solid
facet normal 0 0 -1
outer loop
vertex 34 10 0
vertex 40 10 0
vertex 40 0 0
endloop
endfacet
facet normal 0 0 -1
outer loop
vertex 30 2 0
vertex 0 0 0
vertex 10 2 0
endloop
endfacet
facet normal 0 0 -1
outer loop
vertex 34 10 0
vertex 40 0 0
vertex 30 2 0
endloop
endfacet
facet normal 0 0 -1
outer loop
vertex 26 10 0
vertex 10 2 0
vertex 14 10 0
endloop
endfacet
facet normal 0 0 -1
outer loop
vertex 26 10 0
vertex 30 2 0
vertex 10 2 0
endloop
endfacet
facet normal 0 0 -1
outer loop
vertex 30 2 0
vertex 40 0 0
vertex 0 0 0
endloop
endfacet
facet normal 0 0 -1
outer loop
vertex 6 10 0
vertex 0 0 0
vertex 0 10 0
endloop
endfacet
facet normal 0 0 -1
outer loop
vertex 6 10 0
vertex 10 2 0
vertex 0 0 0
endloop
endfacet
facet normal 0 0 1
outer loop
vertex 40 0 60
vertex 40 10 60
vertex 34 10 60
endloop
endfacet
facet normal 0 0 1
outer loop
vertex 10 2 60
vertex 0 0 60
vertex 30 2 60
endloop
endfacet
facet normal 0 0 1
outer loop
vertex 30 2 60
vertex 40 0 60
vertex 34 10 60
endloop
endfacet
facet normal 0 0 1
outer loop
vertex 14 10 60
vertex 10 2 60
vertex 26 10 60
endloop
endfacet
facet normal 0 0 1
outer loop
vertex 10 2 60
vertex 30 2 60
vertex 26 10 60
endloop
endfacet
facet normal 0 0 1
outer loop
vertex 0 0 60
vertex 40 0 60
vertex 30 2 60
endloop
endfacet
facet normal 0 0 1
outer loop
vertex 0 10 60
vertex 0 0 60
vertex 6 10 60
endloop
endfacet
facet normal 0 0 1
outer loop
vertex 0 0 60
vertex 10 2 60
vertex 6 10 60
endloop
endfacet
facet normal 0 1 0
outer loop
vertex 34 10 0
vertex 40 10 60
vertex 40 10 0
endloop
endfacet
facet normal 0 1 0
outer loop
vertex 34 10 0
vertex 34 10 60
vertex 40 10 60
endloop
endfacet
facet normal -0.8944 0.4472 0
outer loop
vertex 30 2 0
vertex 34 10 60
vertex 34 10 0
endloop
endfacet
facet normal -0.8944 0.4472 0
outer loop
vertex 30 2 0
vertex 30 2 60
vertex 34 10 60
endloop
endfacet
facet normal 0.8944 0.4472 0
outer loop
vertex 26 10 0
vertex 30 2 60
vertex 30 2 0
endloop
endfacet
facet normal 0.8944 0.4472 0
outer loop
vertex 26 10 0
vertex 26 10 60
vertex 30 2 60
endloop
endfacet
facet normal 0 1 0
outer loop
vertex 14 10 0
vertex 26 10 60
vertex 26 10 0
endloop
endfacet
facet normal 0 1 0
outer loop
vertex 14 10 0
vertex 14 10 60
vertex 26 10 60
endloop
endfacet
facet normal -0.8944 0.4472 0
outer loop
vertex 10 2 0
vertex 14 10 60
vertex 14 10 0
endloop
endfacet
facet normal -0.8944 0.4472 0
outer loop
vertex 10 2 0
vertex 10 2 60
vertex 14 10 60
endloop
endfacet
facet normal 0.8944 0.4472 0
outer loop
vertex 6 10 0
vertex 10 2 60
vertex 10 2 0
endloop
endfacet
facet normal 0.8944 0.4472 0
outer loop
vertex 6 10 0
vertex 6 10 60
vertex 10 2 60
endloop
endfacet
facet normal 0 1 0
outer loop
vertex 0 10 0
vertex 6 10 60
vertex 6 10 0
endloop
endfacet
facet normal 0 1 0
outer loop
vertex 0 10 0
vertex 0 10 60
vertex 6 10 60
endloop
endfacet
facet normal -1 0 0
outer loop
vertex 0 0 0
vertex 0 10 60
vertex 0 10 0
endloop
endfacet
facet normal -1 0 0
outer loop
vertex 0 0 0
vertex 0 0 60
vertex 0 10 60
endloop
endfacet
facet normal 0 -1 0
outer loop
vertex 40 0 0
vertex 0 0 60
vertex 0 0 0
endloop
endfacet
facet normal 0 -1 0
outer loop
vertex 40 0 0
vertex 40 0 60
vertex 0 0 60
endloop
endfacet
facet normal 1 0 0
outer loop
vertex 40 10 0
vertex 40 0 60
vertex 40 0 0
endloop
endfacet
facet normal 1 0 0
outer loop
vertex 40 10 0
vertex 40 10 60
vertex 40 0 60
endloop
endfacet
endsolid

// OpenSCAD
$fn = 32;

// ----------------------------------------------------------------------
// V guide rail: doublev, 40 mm wide
// ----------------------------------------------------------------------

// --- parameters (mm) ---
rail_w = 40;              // rail width, X
base_t = 10;              // base plate thickness
v_depth = 8;              // V feature depth / height
v_half_w = 8;             // half width of the V at the base face
plate_t = 60;             // rail length, Z (the extrusion height)
groove_off = 10;          // offset of each groove from the centreline

centre_x = rail_w / 2;  // rail centreline
groove_a = centre_x - groove_off;  // axis of the first groove
groove_b = centre_x + groove_off;  // axis of the second groove

profile = [[0, 0], [40, 0], [40, 10], [34, 10], [30, 2], [26, 10], [14, 10], [10, 2], [6, 10], [0, 10]];  // primary outline, 10 points, counter clockwise

// --- the one profile operation ---
linear_extrude(height = plate_t) polygon(points = profile);
